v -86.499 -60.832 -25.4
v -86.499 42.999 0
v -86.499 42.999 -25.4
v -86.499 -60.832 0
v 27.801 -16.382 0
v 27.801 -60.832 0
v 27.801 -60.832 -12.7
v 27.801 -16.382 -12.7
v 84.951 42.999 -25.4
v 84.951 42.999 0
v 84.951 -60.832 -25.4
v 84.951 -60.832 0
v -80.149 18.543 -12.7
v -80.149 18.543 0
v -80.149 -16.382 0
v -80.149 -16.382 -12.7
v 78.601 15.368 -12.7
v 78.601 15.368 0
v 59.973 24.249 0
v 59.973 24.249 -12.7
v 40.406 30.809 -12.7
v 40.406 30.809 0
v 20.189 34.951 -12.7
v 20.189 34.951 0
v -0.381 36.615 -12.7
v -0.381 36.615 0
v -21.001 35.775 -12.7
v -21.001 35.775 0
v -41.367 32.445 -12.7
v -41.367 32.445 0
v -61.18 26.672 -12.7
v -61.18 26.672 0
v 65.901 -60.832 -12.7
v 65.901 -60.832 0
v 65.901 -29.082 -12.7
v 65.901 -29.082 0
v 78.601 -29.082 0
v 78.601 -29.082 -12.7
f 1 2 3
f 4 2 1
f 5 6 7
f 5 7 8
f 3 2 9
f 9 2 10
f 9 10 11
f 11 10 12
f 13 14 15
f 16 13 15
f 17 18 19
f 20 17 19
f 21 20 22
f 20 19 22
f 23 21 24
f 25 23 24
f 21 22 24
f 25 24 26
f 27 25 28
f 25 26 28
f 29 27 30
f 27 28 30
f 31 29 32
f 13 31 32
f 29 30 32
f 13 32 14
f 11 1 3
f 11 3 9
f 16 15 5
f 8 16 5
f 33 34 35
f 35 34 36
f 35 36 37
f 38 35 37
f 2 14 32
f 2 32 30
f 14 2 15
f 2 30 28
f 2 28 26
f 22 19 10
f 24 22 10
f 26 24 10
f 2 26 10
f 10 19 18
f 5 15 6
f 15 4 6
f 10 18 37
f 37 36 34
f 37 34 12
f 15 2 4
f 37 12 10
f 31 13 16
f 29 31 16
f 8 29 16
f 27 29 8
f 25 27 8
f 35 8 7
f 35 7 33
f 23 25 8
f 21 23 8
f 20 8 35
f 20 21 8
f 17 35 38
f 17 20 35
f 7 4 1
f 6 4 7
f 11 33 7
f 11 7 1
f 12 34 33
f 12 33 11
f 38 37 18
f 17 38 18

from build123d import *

# Parameters (mm, degrees)
F1_DEPTH = 12.7
F2_W     = 171.45
F2_H     = 103.8304664585
F3_DEPTH = 25.4
F4_DEPTH = 25.4
F5_W     = 38.1
F5_H     = 6.35
F6_DEPTH = 12.7


with BuildPart() as f1:
    # F0 (on Top) → F1 (new body)
    with BuildSketch(Plane.XY):
        with BuildLine():
            Line((65.9010224927, -54.4816457485), (65.9010224927, -29.0816457485))
            Line((65.9010224927, -29.0816457485), (78.6010224927, -29.0816457485))
            Line((78.6010224927, -29.0816457485), (78.6010224927, 15.3683542515))
            ThreePointArc((78.6010224927, 15.3683542515), (-0.3807983971, 36.6148097647), (-80.1489775073, 18.5433542515))
            Line((-80.1489775073, 18.5433542515), (-80.1489775073, -16.3816457485))
            Line((-80.1489775073, -16.3816457485), (27.8010224927, -16.3816457485))
            Line((27.8010224927, -16.3816457485), (27.8010224927, -54.4816457485))
            Line((27.8010224927, -54.4816457485), (65.9010224927, -54.4816457485))
        make_face()
    extrude(amount=F1_DEPTH)

    # F2 (on face) → F3 (join)
    with BuildSketch(Plane(origin=(0, 0, 0), x_dir=(1, 0, 0), z_dir=(0, 0, -1))):
        with Locations((-0.7739775073, 8.9164125192)):
            Rectangle(F2_W, F2_H)
    extrude(amount=F3_DEPTH)

    # F4 (cut): a face of the model
    f4_faces = [f1.faces().sort_by_distance(p)[0] for p in [
        (7.501284612, -0.1265709207, 12.7),
    ]]
    extrude(f4_faces, amount=-F4_DEPTH, mode=Mode.SUBTRACT)

    # F5 (on face) → F6 (cut)
    with BuildSketch(Plane.XY):
        with Locations((46.8510224927, -57.6566457485)):
            Rectangle(F5_W, F5_H)
    extrude(amount=-F6_DEPTH, mode=Mode.SUBTRACT)


solid = f1.part
